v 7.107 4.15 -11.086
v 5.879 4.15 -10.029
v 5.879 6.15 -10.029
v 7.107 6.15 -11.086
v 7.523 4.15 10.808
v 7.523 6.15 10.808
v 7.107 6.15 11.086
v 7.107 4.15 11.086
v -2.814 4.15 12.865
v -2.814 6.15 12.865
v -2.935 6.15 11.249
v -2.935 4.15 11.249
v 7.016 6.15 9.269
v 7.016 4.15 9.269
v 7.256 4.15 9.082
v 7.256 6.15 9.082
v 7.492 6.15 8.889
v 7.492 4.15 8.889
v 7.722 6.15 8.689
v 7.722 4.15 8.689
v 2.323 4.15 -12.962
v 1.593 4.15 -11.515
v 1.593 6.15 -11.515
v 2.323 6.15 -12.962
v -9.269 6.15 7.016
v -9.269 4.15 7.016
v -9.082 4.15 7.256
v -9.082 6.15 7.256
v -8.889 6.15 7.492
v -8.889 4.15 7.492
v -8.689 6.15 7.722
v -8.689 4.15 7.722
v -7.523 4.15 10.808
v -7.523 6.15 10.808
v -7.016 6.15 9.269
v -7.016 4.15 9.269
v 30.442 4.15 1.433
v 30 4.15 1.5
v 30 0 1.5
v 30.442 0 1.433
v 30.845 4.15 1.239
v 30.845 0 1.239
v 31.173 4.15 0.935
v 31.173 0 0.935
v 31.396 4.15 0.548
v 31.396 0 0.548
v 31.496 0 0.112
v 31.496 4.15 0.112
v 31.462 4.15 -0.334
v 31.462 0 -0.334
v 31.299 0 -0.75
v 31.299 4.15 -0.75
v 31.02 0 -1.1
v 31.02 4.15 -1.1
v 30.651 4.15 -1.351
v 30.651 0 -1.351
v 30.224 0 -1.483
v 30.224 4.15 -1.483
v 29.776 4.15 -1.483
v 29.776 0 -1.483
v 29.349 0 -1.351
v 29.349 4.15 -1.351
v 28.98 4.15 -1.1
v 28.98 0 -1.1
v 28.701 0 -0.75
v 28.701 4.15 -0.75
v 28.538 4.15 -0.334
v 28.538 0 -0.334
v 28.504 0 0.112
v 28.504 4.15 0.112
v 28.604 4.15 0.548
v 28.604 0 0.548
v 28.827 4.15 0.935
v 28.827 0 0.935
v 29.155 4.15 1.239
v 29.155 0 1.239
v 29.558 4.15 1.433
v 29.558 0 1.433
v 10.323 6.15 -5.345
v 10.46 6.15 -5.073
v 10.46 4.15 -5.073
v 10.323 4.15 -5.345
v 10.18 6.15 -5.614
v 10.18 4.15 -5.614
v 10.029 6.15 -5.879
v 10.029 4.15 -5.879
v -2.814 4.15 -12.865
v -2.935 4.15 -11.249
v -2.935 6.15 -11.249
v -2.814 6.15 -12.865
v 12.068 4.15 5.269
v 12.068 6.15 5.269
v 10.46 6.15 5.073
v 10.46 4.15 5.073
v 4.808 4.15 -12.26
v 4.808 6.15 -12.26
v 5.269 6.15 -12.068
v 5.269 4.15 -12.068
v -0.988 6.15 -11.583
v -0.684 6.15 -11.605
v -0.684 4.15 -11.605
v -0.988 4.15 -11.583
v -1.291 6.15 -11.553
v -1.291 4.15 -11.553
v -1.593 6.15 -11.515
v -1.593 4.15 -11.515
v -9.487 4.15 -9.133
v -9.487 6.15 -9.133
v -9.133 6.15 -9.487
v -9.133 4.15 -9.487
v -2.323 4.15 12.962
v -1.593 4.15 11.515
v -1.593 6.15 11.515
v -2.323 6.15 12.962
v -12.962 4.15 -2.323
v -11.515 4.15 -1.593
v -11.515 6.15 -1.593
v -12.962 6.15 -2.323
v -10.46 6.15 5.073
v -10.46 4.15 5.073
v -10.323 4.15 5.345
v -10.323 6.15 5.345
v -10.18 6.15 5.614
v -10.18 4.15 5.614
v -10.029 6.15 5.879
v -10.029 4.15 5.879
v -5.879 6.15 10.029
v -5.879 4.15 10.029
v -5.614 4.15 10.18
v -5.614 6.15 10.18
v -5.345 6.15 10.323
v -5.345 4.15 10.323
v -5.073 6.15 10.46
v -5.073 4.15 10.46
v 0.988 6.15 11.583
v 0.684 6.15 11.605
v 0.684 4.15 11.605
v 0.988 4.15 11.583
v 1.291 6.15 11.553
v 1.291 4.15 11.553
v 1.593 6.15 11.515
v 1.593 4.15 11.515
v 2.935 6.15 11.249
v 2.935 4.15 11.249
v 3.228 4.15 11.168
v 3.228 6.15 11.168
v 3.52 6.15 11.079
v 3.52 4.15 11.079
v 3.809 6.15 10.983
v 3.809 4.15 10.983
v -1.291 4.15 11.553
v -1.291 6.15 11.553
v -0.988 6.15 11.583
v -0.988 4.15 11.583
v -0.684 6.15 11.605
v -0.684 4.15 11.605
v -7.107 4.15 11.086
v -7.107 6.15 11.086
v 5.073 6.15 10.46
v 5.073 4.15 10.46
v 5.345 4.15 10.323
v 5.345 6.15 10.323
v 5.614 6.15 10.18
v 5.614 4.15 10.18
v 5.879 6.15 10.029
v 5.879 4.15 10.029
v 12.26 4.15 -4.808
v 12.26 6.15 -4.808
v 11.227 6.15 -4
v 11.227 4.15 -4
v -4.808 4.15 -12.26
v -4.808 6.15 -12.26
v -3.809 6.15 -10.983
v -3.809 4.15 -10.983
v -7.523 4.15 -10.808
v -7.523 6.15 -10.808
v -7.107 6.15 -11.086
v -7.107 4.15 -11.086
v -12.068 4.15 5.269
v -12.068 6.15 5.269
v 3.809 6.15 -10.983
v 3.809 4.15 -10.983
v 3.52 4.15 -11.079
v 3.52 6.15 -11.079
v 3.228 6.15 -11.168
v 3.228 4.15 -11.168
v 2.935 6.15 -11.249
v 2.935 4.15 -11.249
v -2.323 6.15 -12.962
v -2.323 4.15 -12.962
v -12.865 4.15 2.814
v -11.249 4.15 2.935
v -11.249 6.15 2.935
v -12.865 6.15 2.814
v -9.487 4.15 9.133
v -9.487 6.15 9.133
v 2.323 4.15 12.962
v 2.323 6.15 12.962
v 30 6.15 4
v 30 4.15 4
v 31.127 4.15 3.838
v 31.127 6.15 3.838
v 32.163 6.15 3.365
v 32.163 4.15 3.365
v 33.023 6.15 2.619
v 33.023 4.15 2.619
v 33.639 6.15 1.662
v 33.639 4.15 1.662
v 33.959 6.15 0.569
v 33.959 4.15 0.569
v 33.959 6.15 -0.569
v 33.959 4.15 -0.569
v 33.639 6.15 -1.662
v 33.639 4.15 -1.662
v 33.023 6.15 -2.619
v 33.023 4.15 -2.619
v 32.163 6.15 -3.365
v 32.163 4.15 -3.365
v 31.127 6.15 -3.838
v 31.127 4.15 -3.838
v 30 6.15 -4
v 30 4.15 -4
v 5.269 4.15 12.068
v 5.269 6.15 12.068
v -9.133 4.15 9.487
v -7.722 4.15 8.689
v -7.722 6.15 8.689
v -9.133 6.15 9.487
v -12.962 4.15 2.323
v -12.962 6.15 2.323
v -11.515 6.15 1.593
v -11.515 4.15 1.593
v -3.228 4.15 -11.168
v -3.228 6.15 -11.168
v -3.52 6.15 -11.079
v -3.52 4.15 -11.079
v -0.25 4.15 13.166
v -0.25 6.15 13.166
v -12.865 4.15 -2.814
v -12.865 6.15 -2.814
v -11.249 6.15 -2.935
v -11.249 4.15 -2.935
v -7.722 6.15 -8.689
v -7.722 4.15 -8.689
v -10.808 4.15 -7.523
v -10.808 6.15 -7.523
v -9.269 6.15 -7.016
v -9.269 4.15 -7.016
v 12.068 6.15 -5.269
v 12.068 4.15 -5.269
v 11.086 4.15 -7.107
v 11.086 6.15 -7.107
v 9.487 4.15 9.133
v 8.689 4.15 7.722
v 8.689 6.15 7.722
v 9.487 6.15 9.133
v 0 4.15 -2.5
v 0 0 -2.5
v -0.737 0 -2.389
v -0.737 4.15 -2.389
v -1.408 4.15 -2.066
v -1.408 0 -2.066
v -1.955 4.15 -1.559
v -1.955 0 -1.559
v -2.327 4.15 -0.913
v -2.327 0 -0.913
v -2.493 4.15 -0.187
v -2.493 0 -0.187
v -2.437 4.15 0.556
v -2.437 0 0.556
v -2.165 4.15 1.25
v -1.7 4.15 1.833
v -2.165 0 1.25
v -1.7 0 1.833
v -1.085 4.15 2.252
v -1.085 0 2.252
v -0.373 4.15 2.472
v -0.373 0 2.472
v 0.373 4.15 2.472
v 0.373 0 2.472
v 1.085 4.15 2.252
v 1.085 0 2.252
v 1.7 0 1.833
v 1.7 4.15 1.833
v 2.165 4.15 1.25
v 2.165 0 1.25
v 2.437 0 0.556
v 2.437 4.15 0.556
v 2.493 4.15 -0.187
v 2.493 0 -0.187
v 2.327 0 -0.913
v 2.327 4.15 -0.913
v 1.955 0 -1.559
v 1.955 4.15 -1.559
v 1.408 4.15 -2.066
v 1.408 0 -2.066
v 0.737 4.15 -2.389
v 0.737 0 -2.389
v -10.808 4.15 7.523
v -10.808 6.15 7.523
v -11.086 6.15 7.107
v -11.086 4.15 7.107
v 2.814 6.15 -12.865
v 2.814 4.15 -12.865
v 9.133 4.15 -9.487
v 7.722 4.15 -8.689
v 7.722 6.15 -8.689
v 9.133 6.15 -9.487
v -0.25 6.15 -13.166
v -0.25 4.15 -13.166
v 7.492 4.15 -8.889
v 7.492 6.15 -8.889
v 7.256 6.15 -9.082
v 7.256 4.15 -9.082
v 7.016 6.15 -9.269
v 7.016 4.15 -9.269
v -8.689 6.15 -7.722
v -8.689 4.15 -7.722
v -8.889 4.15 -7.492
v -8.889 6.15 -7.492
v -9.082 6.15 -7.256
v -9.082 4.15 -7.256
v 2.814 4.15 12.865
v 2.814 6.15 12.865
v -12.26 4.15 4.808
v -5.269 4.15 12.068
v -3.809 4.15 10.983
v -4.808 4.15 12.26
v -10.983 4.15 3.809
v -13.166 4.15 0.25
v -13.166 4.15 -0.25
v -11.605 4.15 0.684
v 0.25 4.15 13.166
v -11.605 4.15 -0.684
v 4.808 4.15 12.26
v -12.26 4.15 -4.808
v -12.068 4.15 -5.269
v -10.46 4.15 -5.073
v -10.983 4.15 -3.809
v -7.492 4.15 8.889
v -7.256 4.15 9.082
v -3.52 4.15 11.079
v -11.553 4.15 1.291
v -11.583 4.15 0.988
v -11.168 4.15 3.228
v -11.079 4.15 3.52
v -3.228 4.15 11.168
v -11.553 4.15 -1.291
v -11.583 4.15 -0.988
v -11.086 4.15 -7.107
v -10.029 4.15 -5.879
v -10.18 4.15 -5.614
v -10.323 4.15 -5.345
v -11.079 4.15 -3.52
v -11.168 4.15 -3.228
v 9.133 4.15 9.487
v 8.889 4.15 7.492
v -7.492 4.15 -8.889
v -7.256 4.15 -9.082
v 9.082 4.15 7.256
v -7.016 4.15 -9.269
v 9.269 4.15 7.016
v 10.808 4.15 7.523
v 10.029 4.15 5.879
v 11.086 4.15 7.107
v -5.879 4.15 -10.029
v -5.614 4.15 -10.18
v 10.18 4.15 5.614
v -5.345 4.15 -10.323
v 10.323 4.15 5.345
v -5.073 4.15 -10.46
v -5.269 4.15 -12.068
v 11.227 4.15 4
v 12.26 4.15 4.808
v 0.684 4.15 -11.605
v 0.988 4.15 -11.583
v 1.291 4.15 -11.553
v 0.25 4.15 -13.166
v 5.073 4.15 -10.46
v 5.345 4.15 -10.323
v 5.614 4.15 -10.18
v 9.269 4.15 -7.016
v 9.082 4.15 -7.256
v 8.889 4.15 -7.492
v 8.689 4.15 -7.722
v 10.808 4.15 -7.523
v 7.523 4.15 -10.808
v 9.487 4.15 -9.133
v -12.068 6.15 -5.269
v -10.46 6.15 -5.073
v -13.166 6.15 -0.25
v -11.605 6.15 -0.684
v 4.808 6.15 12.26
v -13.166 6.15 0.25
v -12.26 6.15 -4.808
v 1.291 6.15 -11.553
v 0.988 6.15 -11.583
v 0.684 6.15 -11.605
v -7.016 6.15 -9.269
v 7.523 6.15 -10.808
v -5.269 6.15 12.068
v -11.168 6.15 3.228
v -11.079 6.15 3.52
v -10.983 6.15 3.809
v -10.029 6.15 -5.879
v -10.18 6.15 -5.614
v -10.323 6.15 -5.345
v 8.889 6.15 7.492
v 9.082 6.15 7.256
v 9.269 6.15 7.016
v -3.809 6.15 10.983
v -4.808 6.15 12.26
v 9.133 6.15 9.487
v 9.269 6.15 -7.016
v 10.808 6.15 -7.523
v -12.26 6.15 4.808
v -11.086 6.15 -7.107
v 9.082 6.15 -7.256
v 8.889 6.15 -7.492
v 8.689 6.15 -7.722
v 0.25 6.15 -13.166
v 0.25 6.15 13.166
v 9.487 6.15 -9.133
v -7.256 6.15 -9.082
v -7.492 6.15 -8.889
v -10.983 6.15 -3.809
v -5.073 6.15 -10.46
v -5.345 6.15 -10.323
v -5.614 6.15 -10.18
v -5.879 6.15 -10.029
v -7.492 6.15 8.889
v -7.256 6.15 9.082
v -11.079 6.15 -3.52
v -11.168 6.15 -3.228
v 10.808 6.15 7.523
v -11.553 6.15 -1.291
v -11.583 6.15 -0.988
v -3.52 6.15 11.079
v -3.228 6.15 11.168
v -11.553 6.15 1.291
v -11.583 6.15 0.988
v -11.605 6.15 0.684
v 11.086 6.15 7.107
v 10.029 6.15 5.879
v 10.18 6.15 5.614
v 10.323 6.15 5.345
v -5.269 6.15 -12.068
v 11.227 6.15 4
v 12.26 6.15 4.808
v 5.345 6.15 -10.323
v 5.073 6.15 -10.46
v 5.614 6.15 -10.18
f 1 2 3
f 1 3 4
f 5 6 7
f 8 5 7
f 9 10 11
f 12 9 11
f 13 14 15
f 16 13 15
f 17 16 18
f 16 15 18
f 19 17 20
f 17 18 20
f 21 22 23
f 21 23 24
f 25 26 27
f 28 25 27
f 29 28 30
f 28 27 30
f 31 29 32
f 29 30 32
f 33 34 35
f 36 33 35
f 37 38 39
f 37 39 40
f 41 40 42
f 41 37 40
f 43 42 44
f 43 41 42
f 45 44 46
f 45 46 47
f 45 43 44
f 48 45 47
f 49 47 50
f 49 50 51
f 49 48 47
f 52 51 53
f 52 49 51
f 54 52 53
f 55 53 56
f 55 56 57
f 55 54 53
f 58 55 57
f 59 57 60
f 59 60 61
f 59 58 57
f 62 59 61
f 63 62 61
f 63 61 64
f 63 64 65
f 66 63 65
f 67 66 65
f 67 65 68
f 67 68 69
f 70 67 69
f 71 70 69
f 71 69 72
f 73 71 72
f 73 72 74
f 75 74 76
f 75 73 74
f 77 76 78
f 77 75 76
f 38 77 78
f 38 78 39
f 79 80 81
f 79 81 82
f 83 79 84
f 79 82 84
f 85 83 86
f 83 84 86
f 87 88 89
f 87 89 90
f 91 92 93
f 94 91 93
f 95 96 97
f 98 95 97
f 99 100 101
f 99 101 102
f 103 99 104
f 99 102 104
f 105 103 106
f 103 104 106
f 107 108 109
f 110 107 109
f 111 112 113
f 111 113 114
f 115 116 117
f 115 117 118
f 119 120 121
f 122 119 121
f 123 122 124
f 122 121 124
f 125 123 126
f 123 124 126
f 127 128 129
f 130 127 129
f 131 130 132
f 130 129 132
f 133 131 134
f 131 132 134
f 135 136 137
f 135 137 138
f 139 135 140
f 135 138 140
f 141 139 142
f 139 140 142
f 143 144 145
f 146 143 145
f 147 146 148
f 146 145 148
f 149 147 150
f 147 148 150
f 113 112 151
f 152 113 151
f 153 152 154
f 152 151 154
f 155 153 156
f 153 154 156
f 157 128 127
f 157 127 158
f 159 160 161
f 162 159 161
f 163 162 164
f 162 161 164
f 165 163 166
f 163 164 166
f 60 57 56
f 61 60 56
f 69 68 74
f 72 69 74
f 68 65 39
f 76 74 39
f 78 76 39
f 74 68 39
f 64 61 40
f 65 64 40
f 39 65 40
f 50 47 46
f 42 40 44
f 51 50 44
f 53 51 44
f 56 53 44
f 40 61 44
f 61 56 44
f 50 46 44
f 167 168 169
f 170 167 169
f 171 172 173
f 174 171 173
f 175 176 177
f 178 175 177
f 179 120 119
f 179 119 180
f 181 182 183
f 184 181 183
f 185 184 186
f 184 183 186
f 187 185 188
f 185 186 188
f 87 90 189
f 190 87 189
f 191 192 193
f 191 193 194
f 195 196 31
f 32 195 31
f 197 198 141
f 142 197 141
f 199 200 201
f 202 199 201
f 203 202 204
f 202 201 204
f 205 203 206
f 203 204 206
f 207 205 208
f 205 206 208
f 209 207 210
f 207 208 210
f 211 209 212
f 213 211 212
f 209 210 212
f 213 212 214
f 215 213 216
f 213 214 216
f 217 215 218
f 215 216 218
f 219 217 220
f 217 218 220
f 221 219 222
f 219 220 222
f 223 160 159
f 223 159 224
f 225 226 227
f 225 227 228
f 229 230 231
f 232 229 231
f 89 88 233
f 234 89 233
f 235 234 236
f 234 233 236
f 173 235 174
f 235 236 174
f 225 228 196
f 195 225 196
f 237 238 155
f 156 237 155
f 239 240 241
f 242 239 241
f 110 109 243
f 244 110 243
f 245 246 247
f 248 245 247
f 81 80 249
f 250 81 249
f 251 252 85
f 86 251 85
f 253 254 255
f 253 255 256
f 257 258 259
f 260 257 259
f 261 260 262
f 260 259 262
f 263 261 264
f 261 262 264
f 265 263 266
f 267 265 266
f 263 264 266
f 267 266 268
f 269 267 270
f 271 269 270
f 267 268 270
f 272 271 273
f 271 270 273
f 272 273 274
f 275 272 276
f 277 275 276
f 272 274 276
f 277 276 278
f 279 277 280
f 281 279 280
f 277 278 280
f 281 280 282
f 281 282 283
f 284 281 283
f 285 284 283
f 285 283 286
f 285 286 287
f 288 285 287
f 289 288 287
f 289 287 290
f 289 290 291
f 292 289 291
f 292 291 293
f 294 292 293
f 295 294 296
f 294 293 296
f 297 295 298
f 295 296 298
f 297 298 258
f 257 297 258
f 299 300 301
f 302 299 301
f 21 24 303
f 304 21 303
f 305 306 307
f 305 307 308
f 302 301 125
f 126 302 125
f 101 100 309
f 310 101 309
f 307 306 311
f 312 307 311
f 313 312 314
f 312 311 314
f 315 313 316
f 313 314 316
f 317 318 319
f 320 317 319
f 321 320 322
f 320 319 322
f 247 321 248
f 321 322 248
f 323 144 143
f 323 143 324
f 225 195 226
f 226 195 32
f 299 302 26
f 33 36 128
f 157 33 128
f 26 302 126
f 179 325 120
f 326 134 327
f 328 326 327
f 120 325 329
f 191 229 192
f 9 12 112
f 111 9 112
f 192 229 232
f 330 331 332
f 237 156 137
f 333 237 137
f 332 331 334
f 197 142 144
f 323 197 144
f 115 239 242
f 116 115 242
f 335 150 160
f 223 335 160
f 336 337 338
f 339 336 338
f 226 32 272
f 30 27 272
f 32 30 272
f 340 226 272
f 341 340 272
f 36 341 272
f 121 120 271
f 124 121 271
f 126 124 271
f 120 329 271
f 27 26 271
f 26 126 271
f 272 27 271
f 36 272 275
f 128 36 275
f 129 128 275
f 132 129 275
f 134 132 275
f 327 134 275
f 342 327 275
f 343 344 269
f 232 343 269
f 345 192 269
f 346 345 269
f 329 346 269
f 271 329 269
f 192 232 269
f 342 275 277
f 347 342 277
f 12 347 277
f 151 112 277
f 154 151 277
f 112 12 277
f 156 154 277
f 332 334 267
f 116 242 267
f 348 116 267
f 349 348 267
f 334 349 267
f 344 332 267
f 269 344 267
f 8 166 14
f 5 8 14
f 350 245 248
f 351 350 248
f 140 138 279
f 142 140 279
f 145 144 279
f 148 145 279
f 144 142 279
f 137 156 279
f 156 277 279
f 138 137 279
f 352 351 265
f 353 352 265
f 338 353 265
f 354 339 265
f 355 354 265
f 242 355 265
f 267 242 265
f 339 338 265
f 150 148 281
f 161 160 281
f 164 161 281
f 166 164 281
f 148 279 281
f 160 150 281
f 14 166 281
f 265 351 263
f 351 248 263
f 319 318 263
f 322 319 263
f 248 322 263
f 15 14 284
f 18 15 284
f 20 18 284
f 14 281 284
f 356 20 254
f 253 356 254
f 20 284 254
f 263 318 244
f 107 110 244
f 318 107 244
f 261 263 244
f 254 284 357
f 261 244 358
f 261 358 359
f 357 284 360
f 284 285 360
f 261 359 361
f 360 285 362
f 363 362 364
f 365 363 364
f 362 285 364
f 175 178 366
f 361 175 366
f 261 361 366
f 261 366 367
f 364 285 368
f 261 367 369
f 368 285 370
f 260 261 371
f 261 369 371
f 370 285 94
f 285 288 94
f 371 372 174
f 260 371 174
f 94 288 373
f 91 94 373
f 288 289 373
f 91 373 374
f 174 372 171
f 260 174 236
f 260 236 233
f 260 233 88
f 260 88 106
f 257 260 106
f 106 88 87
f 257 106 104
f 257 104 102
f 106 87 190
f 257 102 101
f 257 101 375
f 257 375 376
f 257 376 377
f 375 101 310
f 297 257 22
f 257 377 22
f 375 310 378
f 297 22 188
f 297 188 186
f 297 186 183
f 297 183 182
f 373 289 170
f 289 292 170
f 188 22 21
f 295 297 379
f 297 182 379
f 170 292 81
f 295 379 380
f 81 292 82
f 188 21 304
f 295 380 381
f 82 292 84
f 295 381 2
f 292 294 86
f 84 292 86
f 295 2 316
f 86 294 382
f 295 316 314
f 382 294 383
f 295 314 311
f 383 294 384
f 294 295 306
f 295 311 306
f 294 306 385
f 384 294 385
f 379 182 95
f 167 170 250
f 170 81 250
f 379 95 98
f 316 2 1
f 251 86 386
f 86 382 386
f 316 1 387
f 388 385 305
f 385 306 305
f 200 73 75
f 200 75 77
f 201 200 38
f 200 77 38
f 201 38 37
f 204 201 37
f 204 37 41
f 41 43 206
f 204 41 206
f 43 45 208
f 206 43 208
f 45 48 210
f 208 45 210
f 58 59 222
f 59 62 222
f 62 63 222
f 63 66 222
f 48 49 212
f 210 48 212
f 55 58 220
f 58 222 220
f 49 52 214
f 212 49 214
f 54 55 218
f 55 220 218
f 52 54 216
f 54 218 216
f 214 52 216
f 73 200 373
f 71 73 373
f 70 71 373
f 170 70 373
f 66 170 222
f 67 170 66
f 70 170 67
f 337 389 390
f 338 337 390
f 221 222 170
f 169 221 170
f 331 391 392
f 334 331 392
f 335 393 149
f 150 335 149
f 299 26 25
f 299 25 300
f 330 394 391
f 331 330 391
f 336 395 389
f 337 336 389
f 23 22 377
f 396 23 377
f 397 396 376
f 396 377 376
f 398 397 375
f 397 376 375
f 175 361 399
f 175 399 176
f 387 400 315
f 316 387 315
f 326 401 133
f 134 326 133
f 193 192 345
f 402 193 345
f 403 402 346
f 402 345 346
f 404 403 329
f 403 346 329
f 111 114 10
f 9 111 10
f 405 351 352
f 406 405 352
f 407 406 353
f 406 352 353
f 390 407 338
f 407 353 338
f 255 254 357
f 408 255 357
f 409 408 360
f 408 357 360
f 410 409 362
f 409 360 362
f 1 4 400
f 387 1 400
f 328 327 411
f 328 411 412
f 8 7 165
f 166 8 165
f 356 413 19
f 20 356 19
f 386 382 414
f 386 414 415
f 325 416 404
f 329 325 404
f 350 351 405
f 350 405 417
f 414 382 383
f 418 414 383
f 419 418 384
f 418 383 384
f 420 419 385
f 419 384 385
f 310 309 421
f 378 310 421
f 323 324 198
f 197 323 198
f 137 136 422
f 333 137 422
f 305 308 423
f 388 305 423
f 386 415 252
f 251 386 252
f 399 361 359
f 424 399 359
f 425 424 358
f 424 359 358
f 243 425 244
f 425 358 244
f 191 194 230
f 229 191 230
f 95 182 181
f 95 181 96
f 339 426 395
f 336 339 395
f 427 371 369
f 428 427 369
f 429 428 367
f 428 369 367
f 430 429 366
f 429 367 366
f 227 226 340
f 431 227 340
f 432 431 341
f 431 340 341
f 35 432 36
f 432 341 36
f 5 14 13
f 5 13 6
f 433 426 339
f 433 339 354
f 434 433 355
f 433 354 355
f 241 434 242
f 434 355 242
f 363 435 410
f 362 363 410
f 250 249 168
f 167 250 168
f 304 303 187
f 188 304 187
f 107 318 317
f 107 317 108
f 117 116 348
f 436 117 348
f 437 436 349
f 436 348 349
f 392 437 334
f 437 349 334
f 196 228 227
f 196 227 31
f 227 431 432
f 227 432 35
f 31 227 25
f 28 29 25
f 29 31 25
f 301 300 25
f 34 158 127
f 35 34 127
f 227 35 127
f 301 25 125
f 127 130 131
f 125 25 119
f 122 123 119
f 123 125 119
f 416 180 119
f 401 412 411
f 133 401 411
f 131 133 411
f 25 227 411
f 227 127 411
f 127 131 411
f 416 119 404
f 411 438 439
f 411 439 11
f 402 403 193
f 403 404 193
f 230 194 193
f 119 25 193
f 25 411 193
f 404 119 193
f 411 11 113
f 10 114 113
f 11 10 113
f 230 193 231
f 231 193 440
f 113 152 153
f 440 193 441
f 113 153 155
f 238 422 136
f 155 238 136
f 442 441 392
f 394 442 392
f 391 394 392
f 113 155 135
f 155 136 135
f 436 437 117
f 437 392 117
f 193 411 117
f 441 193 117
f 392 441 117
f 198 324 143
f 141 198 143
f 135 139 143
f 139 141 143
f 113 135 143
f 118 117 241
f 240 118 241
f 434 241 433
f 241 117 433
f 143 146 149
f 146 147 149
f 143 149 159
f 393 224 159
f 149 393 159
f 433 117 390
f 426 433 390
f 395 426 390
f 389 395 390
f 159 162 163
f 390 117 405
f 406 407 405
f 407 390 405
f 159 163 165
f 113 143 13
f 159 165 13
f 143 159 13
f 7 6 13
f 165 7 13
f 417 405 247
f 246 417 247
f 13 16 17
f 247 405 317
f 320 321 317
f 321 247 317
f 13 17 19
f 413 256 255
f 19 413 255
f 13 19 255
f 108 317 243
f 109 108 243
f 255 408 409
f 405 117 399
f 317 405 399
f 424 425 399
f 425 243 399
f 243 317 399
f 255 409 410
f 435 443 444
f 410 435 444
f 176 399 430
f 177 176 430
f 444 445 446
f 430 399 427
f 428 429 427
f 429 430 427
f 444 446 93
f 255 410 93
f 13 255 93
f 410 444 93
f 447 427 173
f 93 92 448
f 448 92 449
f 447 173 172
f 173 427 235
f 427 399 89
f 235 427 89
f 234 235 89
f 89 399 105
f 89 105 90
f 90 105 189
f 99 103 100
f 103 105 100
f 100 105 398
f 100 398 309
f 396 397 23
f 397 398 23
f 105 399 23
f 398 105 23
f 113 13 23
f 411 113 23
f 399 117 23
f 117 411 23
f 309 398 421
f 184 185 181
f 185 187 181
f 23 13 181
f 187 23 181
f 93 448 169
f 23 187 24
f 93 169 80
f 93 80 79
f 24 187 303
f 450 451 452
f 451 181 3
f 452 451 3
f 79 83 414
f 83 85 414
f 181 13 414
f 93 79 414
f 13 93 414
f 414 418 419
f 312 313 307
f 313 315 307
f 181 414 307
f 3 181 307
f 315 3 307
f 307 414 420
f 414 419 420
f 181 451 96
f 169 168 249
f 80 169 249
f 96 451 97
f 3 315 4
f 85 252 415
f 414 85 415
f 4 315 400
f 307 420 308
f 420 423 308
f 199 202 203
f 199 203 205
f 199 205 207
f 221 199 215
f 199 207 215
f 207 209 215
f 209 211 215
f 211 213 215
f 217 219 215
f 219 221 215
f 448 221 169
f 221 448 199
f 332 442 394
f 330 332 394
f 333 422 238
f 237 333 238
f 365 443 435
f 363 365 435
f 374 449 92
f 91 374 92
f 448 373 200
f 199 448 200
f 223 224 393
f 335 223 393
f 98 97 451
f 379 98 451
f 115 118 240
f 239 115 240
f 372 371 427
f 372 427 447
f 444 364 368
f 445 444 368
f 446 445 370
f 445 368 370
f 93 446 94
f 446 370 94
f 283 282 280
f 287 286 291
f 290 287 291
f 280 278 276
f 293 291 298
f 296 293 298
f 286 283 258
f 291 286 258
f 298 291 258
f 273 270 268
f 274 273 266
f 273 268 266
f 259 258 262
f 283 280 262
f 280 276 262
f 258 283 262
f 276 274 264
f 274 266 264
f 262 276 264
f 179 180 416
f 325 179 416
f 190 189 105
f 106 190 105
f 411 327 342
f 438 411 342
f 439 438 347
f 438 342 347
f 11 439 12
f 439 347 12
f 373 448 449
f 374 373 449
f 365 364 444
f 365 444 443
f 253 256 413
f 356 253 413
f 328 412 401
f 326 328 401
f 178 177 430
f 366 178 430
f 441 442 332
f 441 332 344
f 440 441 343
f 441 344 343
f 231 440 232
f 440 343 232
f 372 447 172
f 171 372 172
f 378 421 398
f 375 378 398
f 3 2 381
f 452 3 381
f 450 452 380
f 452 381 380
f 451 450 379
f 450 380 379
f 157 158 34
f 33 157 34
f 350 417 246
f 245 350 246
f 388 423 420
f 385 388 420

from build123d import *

# Parameters (mm, degrees)
SKETCH3_R           = 2.5
BOSS_EXTRUDE1_DEPTH = 4.15
SKETCH4_R           = 1.5
BOSS_EXTRUDE2_DEPTH = 2
SKETCH4_3_R         = 1.5
BOSS_EXTRUDE3_DEPTH = 2
SKETCH4_5_R         = 1.5
BOSS_EXTRUDE4_DEPTH = 4.15
BOSS_EXTRUDE5_DEPTH = 2
CIRPATTERN1_COUNT   = 32


with BuildPart() as part:
    # Sketch3 → Boss-Extrude1 (new body)
    with BuildSketch(Plane(origin=(0, 0, 0), x_dir=(1, 0, 0), z_dir=(0, 1, 0))):
        with Locations(Location((0, 0, 0), (0, 0, 90))):
            Circle(SKETCH3_R)
    extrude(amount=BOSS_EXTRUDE1_DEPTH)

    # Sketch4 → Boss-Extrude2 (add)
    with BuildSketch(Plane(origin=(0, 4.15, 0), x_dir=(1, 0, 0), z_dir=(0, 1, 0))):
        with BuildLine():
            Line((30, 4), (10.915155748, 4))
            ThreePointArc((10.915155748, 4), (-11.625, 0), (10.915155748, -4))
            Line((10.915155748, -4), (30, -4))
            ThreePointArc((30, -4), (34, 0), (30, 4))
        make_face()
        with Locations(Location((30, 0, 0), (0, 0, 270))):
            Circle(SKETCH4_R, mode=Mode.SUBTRACT)
    extrude(amount=BOSS_EXTRUDE2_DEPTH)

    # Sketch4<3> → Boss-Extrude3 (add)
    with BuildSketch(Plane(origin=(0, 4.15, 0), x_dir=(1, 0, 0), z_dir=(0, 1, 0))):
        with Locations((30, 0)):
            Circle(SKETCH4_3_R)
    extrude(amount=BOSS_EXTRUDE3_DEPTH)

    # Sketch4<5> → Boss-Extrude4 (add)
    with BuildSketch(Plane(origin=(0, 4.15, 0), x_dir=(1, 0, 0), z_dir=(0, 1, 0))):
        with Locations(Location((30, 0, 0), (0, 0, 270))):
            Circle(SKETCH4_5_R)
    extrude(amount=-BOSS_EXTRUDE4_DEPTH)

    # Sketch7 → Boss-Extrude5 (add)
    with BuildSketch(Plane(origin=(0, 6.15, 0), x_dir=(1, 0, 0), z_dir=(0, 1, 0))):
        Polygon((-11.366268694, 0.75), (-11.366268694, -0.75), (-13.166268694, -0.25), (-13.166268694, 0.25), align=None)
    boss_extrude5 = extrude(amount=-BOSS_EXTRUDE5_DEPTH)

    # CirPattern1: Boss-Extrude5 ×32 about axis
    cirpattern1_axis = Axis((0, 0, 0), (0, 1, 0))
    for i in range(1, CIRPATTERN1_COUNT):
        add(boss_extrude5.rotate(cirpattern1_axis, i * 360 / CIRPATTERN1_COUNT))


solid = part.part
